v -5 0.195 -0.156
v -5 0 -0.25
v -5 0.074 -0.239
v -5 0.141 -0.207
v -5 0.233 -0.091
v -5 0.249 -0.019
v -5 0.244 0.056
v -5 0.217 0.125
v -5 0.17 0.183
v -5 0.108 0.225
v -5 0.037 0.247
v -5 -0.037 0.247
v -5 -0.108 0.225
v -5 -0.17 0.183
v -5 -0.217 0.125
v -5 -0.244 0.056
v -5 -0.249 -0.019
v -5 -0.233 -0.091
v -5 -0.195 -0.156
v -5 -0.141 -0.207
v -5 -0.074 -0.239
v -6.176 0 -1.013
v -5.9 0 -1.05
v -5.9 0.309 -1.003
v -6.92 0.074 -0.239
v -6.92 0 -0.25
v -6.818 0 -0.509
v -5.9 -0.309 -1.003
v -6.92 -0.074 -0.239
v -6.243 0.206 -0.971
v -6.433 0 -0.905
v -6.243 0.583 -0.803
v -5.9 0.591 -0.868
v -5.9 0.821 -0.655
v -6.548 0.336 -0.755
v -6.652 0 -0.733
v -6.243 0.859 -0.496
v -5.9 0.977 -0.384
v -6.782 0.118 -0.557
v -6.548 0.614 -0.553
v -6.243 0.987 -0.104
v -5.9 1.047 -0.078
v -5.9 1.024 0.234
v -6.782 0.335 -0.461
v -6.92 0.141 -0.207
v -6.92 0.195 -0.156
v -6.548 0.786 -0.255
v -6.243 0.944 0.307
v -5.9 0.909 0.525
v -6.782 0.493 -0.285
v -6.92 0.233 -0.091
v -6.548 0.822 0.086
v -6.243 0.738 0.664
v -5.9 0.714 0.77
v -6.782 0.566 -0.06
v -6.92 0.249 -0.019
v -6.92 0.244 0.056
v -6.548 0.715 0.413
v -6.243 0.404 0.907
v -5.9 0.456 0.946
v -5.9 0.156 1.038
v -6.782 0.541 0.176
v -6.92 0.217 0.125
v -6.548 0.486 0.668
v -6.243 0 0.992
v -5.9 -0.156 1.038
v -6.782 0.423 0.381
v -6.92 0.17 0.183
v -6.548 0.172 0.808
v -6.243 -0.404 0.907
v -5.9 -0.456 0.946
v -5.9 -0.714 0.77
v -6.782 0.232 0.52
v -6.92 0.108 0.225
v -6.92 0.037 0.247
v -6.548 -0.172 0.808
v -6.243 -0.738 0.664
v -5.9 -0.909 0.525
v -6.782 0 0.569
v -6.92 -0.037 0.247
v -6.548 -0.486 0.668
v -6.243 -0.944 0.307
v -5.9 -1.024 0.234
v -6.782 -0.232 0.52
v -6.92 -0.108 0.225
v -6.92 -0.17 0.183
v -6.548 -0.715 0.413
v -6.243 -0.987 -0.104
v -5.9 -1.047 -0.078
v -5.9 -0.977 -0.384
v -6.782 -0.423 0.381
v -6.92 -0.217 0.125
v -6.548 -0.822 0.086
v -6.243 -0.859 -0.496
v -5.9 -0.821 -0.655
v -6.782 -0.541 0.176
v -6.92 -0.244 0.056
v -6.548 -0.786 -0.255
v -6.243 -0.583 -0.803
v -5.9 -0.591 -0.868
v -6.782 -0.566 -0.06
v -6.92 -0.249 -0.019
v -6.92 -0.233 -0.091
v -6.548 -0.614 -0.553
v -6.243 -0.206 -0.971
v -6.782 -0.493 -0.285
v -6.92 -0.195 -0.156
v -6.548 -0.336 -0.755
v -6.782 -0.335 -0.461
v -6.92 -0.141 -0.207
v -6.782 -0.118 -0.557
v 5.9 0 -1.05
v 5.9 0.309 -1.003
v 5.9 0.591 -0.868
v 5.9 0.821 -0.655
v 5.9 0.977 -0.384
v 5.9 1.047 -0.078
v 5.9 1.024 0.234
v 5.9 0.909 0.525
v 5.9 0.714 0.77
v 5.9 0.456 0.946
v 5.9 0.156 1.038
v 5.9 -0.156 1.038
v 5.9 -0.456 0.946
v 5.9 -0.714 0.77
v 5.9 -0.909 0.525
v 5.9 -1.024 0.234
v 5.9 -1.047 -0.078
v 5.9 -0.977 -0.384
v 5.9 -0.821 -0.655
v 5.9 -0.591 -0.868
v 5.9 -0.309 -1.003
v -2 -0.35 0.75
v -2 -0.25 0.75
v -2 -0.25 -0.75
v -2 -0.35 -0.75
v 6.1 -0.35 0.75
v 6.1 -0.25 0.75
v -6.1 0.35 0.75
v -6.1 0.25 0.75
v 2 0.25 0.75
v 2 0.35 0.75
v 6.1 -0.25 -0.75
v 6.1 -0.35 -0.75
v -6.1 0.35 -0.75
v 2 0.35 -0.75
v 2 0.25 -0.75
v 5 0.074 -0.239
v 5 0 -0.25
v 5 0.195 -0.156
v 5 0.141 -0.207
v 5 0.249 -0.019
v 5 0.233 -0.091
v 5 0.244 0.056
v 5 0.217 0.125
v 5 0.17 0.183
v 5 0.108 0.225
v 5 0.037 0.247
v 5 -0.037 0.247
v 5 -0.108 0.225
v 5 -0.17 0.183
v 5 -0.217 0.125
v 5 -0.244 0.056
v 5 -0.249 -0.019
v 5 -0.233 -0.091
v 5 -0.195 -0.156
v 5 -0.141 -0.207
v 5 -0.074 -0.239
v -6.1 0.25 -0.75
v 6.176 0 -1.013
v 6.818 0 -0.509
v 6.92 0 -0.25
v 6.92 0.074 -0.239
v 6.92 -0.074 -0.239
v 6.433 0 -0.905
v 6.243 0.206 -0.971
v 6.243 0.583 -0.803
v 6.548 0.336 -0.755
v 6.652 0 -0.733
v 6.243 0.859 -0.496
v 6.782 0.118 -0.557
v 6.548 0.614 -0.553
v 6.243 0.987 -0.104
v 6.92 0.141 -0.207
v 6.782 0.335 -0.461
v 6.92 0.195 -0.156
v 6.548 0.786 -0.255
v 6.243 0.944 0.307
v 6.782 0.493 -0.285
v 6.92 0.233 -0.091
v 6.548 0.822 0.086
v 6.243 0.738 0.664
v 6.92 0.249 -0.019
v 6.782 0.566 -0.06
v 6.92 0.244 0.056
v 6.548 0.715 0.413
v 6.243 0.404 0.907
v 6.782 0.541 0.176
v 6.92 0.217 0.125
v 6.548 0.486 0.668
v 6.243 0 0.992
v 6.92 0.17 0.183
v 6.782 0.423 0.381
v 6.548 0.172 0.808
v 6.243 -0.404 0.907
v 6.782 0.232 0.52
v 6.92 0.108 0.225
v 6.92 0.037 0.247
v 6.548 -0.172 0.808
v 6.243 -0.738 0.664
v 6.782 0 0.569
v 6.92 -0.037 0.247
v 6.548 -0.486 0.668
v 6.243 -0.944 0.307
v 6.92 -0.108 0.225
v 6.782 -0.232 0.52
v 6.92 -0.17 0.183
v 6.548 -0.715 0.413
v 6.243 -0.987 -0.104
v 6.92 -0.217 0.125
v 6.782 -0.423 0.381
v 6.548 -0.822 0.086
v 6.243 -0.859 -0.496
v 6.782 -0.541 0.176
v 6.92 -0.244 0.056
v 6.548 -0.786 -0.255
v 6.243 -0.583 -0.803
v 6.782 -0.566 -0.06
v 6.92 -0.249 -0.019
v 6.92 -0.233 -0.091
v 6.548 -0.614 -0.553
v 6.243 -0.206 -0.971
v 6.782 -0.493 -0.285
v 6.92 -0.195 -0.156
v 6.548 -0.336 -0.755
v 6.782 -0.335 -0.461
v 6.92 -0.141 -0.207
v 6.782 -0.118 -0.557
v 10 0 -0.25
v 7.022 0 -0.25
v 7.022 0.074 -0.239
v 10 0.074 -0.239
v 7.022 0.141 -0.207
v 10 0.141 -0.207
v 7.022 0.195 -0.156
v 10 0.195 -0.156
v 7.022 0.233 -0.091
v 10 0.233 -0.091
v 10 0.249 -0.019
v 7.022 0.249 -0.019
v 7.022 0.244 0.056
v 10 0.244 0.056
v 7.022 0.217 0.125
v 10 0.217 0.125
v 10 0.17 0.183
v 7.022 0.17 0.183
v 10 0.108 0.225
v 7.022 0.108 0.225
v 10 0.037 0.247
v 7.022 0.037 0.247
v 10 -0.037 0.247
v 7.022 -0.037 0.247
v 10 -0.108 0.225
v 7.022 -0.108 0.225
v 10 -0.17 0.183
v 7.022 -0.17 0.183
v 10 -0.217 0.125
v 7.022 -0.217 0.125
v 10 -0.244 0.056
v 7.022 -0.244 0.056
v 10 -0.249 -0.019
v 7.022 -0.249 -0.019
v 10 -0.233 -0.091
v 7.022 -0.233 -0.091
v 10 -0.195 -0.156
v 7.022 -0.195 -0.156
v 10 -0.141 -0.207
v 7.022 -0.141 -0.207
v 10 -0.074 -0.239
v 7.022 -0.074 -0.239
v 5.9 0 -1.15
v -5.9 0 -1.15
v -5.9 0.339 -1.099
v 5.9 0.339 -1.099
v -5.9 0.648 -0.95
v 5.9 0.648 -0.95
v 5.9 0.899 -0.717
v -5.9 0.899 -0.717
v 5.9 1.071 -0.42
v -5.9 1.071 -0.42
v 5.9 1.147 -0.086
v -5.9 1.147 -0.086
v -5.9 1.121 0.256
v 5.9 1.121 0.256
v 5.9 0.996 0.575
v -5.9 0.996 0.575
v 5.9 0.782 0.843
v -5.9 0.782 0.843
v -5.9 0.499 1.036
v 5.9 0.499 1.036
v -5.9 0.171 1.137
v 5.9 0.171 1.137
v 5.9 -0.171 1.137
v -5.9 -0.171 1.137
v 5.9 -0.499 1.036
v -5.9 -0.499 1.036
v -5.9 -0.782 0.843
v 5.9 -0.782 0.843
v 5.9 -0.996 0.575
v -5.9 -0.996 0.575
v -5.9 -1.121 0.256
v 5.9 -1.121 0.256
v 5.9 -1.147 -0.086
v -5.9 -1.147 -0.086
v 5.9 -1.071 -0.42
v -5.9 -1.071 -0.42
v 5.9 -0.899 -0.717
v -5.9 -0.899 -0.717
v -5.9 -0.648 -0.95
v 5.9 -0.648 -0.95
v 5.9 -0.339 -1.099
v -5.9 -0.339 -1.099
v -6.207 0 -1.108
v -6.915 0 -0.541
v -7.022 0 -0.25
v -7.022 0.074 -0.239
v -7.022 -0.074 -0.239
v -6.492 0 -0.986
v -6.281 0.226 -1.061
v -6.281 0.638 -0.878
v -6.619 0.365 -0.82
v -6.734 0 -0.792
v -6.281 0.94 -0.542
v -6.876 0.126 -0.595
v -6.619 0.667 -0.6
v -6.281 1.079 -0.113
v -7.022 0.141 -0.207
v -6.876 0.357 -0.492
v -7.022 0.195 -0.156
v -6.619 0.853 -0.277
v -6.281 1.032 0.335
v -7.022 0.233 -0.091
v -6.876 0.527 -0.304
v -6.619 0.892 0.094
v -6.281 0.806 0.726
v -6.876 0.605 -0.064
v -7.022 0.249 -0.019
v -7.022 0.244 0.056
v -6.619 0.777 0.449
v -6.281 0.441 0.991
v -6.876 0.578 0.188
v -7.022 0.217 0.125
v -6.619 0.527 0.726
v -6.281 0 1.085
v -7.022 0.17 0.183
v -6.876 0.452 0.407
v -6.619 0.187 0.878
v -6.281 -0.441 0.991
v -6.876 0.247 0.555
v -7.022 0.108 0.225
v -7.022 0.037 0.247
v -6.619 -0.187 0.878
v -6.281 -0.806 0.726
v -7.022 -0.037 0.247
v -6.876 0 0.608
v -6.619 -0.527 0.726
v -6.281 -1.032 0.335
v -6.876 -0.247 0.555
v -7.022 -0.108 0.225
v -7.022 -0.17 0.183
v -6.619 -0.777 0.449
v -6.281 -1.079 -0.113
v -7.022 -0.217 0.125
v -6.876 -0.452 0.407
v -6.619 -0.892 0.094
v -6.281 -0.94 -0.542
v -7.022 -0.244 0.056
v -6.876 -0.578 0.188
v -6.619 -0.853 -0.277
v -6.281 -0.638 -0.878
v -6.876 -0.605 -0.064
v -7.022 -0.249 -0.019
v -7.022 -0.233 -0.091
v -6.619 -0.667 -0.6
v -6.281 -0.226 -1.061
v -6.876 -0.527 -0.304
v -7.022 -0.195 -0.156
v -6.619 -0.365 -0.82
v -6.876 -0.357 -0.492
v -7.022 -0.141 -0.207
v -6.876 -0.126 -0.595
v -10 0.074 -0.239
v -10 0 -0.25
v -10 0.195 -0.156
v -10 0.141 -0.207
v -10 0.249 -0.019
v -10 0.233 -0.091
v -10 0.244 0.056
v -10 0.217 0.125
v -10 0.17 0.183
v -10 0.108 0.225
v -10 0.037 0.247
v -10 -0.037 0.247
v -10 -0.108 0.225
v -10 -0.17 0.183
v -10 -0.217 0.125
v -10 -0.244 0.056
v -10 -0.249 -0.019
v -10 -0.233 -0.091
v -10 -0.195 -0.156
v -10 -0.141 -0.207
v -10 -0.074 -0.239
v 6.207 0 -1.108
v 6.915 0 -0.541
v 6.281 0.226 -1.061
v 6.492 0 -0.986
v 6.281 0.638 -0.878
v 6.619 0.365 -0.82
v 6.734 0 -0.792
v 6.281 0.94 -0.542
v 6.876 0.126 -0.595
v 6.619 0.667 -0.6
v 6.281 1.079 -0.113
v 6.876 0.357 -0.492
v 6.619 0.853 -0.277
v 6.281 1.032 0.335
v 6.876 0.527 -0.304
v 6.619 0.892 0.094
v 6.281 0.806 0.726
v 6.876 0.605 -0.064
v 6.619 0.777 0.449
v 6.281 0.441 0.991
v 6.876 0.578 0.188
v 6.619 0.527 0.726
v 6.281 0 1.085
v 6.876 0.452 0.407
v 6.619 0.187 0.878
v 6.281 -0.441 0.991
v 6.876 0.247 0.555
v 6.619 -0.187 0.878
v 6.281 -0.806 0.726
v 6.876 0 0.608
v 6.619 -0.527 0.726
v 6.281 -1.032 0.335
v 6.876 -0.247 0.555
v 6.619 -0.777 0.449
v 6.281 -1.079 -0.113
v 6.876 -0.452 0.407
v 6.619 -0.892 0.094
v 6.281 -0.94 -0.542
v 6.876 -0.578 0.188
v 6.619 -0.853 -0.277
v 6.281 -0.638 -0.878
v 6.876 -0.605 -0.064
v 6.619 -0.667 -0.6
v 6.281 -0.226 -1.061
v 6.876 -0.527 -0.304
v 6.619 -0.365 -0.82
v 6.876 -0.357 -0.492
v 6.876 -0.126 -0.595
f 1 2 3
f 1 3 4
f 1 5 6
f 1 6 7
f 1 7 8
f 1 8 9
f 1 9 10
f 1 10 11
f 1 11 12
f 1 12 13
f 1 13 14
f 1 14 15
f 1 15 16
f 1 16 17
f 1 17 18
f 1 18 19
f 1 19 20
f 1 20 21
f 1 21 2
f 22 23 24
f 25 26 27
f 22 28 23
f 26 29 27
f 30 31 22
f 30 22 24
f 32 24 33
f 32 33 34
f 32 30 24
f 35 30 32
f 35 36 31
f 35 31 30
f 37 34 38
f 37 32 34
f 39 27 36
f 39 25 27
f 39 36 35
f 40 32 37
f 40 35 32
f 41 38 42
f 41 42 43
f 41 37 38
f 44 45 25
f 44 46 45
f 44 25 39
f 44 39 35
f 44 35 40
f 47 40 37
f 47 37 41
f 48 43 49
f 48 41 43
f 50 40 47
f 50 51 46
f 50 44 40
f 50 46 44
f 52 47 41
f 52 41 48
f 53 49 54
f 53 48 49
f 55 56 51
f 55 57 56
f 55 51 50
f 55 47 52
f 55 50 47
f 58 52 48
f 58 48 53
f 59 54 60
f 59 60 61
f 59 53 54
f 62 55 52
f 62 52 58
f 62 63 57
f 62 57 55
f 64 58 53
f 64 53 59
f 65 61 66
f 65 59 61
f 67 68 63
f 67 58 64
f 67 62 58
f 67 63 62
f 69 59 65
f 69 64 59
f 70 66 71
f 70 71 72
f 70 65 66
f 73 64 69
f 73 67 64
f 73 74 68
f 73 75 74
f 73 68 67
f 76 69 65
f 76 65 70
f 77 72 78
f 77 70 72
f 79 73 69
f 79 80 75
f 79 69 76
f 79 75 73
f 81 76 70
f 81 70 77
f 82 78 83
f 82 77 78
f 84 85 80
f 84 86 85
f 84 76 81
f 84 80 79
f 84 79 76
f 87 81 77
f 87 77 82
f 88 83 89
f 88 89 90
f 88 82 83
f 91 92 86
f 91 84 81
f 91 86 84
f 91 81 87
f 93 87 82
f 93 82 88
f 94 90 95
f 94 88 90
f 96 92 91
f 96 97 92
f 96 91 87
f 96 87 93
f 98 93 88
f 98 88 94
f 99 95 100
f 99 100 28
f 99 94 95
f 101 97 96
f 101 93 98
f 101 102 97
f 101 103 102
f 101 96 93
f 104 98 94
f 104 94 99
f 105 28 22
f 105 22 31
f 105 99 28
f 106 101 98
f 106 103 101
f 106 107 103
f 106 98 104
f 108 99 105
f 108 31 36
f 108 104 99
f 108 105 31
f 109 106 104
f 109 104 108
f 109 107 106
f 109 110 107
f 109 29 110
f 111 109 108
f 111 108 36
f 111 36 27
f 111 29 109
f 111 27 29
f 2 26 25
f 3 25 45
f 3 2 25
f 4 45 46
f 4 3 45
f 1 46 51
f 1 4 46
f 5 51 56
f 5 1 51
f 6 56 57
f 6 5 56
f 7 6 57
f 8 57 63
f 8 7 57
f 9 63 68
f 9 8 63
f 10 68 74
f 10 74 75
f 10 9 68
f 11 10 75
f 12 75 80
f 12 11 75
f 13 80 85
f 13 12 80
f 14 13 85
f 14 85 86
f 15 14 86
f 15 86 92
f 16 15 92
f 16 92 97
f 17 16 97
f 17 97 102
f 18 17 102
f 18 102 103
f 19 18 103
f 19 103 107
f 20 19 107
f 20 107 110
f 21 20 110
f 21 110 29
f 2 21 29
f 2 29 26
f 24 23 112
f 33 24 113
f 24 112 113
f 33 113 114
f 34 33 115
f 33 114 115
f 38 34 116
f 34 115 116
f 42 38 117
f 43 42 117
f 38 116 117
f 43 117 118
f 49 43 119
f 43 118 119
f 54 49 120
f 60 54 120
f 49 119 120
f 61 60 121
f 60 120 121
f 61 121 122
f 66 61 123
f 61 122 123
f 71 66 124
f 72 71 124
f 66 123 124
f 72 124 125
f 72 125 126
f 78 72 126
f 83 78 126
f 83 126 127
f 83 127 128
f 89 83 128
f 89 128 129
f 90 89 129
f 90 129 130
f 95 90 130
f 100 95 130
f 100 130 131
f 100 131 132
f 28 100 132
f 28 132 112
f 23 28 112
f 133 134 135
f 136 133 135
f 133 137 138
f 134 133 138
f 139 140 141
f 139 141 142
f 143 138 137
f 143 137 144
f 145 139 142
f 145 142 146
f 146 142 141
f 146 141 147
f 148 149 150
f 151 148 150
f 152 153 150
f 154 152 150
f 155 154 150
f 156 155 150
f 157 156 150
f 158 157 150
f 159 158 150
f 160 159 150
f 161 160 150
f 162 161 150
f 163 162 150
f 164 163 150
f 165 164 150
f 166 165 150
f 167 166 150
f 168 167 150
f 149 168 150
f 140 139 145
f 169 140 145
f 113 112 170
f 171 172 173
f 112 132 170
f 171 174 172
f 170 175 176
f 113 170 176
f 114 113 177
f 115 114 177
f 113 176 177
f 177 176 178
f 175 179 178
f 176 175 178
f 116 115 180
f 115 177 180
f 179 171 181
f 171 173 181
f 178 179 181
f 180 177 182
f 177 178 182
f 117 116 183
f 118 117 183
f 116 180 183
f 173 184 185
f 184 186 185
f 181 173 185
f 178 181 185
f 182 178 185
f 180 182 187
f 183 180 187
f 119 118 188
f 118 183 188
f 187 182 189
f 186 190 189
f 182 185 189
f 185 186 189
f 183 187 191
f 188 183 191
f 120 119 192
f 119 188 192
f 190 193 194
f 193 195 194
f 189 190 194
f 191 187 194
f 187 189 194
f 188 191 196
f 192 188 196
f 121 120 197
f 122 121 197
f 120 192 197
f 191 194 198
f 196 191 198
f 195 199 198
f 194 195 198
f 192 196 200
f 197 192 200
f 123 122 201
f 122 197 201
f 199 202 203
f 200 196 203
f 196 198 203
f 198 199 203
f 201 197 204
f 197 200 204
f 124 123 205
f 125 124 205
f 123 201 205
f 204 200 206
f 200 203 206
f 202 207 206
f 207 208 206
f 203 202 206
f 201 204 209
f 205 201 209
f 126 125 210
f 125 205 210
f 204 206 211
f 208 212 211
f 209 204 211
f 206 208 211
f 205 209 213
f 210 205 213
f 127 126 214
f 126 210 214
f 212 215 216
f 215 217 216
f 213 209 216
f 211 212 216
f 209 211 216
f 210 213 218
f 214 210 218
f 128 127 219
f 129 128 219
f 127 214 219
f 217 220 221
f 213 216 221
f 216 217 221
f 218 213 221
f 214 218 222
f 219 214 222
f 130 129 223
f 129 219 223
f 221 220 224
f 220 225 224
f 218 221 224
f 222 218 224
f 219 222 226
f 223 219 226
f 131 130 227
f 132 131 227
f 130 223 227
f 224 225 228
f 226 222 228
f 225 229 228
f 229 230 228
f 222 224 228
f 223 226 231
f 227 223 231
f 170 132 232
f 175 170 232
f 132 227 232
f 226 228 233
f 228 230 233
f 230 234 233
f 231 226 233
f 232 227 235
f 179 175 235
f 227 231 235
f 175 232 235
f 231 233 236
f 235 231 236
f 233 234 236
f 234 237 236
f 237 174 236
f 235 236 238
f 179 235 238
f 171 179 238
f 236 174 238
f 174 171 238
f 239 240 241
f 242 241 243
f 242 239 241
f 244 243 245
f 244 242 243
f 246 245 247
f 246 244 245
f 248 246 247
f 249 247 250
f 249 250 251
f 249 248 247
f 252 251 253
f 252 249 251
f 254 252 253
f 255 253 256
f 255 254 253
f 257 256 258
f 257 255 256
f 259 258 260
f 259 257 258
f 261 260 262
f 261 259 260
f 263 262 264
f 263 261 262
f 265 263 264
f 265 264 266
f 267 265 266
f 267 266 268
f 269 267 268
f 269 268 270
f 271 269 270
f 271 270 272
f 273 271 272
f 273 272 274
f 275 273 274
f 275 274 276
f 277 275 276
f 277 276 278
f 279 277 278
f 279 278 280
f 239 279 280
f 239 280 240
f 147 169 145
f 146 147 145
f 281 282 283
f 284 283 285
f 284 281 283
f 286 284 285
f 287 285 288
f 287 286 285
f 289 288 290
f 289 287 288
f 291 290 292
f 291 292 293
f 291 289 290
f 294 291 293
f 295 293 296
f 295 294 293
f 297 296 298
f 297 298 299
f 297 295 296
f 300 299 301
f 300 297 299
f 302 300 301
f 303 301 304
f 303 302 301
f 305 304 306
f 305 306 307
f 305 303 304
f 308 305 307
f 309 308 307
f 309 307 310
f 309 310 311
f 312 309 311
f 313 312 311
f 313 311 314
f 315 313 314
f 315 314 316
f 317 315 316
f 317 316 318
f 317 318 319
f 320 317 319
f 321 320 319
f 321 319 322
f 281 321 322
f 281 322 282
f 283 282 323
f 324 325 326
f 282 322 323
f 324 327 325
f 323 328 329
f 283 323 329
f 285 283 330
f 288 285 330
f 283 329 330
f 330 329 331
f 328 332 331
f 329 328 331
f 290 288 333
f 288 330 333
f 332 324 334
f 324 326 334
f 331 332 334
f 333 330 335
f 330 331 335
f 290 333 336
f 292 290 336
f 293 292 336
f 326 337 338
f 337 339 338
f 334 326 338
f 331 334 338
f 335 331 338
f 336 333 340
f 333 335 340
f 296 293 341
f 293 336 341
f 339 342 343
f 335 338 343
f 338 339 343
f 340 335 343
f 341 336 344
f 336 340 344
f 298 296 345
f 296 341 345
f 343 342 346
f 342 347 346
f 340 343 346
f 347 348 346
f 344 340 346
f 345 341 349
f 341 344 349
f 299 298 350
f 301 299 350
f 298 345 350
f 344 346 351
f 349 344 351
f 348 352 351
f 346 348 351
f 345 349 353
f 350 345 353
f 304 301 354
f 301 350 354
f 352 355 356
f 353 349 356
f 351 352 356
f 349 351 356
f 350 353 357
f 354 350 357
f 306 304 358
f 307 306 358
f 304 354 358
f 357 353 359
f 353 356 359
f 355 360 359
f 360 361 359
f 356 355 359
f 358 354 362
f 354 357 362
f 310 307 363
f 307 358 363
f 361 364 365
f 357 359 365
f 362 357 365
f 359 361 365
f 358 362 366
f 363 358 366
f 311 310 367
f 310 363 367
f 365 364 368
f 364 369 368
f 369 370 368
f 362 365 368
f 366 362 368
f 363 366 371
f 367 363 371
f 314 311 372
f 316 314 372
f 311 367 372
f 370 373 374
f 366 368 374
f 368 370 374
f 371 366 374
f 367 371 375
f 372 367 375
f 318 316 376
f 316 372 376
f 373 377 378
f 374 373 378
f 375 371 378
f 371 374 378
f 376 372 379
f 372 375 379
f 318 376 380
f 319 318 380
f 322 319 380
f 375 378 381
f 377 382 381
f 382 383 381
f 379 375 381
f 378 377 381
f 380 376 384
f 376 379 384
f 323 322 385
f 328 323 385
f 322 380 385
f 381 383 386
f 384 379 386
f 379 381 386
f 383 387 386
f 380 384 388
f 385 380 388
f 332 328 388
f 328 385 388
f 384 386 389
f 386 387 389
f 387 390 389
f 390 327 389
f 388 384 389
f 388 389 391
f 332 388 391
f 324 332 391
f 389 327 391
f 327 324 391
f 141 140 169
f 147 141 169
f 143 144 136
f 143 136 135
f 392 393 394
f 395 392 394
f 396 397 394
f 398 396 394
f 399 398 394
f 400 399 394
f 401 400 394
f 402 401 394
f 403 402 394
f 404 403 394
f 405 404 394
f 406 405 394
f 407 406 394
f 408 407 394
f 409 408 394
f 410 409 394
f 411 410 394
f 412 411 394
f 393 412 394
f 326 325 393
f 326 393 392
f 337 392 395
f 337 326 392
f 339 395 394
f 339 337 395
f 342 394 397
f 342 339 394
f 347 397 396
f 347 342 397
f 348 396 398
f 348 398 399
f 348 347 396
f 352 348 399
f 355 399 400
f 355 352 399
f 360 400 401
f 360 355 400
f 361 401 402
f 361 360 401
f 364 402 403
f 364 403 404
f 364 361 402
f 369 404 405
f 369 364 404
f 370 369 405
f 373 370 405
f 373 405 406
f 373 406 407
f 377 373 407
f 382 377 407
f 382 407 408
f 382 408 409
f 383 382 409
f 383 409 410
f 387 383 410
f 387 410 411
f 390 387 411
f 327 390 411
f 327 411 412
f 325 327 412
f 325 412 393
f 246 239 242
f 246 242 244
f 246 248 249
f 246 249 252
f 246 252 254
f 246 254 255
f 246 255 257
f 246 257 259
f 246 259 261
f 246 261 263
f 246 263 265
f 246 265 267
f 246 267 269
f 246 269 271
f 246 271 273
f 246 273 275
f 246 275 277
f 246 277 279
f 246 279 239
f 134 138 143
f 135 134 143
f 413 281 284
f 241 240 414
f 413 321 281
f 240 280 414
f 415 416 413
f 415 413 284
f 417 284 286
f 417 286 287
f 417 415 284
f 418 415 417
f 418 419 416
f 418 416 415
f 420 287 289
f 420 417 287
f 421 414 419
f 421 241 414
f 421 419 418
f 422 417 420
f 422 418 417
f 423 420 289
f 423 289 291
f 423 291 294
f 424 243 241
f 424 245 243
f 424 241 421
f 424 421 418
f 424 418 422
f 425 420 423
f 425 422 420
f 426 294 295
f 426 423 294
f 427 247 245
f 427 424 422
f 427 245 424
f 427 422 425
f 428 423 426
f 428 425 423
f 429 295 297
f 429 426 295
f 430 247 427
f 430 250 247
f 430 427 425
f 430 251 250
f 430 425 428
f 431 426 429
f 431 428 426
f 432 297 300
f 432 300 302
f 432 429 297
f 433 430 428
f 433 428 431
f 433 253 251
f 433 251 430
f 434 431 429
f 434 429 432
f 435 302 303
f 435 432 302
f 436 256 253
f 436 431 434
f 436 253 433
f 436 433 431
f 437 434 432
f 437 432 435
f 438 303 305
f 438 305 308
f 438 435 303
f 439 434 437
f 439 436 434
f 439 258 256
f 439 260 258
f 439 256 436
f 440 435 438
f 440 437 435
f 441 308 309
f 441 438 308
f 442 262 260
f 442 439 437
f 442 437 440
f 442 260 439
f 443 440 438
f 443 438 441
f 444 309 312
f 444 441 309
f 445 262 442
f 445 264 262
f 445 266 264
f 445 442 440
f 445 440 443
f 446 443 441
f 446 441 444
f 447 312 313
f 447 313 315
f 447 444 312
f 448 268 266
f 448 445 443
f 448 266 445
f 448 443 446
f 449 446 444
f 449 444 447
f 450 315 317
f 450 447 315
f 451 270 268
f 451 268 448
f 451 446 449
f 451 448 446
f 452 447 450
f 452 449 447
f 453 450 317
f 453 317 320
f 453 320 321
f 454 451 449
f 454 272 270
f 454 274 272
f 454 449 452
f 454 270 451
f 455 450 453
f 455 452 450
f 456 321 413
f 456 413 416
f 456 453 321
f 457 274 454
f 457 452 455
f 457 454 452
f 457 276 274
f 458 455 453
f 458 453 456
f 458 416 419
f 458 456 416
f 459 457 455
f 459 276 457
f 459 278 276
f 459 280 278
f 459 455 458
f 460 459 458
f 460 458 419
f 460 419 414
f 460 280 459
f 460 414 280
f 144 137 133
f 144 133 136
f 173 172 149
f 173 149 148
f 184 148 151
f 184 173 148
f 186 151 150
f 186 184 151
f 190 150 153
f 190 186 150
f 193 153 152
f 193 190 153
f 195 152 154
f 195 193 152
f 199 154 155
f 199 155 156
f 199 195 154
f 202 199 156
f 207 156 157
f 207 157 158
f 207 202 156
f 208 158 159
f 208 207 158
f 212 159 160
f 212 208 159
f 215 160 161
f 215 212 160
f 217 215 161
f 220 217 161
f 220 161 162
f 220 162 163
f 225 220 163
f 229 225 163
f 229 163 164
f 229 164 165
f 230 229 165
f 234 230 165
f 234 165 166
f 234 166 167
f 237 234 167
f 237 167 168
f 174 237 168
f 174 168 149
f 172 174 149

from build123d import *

# Parameters (mm, degrees)
SKETCH1_R                = 1.15
BOSS_EXTRUDE1_DEPTH      = 7.05
FILLET1_R                = 1.15
FILLET1_OF_MIRROR3_R     = 1.15
SHELL2_T                 = 0.1
BOSS_EXTRUDE2_DEPTH      = 2
BOSS_EXTRUDE2_DEPTH_BACK = 6.1
SKETCH2_W                = 1.5
SKETCH2_H                = 0.1
BOSS_EXTRUDE3_DEPTH      = 6.1
BOSS_EXTRUDE3_DEPTH_BACK = 2
SKETCH4_W                = 1.5
SKETCH4_H                = 0.1
SKETCH5_R                = 0.25
BOSS_EXTRUDE4_DEPTH      = 5
BOSS_EXTRUDE5_START      = 5
SKETCH6_R                = 0.25
BOSS_EXTRUDE5_DEPTH      = 5


with BuildPart() as part:
    # Sketch1 → Boss-Extrude1 (new body)
    with BuildSketch(Plane(origin=(0, 0, 0), x_dir=(0, 0, -1), z_dir=(1, 0, 0))):
        Circle(SKETCH1_R)
    boss_extrude1 = extrude(amount=BOSS_EXTRUDE1_DEPTH)

    # Fillet1
    fillet1_edges = [part.edges().sort_by_distance(p)[0] for p in [
        (7.05, 0, 1.15),
    ]]
    fillet(fillet1_edges, radius=FILLET1_R)

    # Mirror3: Boss-Extrude1 across Right Plane
    add(boss_extrude1.mirror(Plane(origin=(0, 0, 0), x_dir=(0, 0, -1), z_dir=(1, 0, 0))))

    # Fillet1 of Mirror3
    fillet1_of_mirror3_edges = [part.edges().sort_by_distance(p)[0] for p in [
        (-7.05, 0, 1.15),
    ]]
    fillet(fillet1_of_mirror3_edges, radius=FILLET1_OF_MIRROR3_R)

    # Shell2 (no face opened: a closed hollow body)
    add(offset(amount=-SHELL2_T, mode=Mode.PRIVATE), mode=Mode.SUBTRACT)

    # Sketch5 → Boss-Extrude4 (add)
    with BuildSketch(Plane(origin=(-5, 0, 0), x_dir=(0, 0, -1), z_dir=(1, 0, 0))):
        Circle(SKETCH5_R)
    extrude(amount=-BOSS_EXTRUDE4_DEPTH)

    # Sketch6 → Boss-Extrude5 (add)
    with BuildSketch(Plane(origin=(5, 0, 0), x_dir=(0, 0, -1), z_dir=(1, 0, 0)).offset(BOSS_EXTRUDE5_START)):
        Circle(SKETCH6_R)
    extrude(amount=-BOSS_EXTRUDE5_DEPTH)


with BuildPart() as body_2:
    # Sketch2 → Boss-Extrude2 (new, two sides: drawn at the far end of the back side and taken through both)
    with BuildSketch(Plane(origin=(0, 0, 0), x_dir=(0, 0, -1), z_dir=(1, 0, 0)).offset(-BOSS_EXTRUDE2_DEPTH_BACK)):
        with Locations((0, 0.3)):
            Rectangle(SKETCH2_W, SKETCH2_H)
    extrude(amount=BOSS_EXTRUDE2_DEPTH + BOSS_EXTRUDE2_DEPTH_BACK)


with BuildPart() as body_3:
    # Sketch4 → Boss-Extrude3 (new, two sides: drawn at the far end of the back side and taken through both)
    with BuildSketch(Plane(origin=(0, 0, 0), x_dir=(0, 0, -1), z_dir=(1, 0, 0)).offset(-BOSS_EXTRUDE3_DEPTH_BACK)):
        with Locations((0, -0.3)):
            Rectangle(SKETCH4_W, SKETCH4_H)
    extrude(amount=BOSS_EXTRUDE3_DEPTH + BOSS_EXTRUDE3_DEPTH_BACK)


solid = Compound([part.part, body_2.part, body_3.part])
